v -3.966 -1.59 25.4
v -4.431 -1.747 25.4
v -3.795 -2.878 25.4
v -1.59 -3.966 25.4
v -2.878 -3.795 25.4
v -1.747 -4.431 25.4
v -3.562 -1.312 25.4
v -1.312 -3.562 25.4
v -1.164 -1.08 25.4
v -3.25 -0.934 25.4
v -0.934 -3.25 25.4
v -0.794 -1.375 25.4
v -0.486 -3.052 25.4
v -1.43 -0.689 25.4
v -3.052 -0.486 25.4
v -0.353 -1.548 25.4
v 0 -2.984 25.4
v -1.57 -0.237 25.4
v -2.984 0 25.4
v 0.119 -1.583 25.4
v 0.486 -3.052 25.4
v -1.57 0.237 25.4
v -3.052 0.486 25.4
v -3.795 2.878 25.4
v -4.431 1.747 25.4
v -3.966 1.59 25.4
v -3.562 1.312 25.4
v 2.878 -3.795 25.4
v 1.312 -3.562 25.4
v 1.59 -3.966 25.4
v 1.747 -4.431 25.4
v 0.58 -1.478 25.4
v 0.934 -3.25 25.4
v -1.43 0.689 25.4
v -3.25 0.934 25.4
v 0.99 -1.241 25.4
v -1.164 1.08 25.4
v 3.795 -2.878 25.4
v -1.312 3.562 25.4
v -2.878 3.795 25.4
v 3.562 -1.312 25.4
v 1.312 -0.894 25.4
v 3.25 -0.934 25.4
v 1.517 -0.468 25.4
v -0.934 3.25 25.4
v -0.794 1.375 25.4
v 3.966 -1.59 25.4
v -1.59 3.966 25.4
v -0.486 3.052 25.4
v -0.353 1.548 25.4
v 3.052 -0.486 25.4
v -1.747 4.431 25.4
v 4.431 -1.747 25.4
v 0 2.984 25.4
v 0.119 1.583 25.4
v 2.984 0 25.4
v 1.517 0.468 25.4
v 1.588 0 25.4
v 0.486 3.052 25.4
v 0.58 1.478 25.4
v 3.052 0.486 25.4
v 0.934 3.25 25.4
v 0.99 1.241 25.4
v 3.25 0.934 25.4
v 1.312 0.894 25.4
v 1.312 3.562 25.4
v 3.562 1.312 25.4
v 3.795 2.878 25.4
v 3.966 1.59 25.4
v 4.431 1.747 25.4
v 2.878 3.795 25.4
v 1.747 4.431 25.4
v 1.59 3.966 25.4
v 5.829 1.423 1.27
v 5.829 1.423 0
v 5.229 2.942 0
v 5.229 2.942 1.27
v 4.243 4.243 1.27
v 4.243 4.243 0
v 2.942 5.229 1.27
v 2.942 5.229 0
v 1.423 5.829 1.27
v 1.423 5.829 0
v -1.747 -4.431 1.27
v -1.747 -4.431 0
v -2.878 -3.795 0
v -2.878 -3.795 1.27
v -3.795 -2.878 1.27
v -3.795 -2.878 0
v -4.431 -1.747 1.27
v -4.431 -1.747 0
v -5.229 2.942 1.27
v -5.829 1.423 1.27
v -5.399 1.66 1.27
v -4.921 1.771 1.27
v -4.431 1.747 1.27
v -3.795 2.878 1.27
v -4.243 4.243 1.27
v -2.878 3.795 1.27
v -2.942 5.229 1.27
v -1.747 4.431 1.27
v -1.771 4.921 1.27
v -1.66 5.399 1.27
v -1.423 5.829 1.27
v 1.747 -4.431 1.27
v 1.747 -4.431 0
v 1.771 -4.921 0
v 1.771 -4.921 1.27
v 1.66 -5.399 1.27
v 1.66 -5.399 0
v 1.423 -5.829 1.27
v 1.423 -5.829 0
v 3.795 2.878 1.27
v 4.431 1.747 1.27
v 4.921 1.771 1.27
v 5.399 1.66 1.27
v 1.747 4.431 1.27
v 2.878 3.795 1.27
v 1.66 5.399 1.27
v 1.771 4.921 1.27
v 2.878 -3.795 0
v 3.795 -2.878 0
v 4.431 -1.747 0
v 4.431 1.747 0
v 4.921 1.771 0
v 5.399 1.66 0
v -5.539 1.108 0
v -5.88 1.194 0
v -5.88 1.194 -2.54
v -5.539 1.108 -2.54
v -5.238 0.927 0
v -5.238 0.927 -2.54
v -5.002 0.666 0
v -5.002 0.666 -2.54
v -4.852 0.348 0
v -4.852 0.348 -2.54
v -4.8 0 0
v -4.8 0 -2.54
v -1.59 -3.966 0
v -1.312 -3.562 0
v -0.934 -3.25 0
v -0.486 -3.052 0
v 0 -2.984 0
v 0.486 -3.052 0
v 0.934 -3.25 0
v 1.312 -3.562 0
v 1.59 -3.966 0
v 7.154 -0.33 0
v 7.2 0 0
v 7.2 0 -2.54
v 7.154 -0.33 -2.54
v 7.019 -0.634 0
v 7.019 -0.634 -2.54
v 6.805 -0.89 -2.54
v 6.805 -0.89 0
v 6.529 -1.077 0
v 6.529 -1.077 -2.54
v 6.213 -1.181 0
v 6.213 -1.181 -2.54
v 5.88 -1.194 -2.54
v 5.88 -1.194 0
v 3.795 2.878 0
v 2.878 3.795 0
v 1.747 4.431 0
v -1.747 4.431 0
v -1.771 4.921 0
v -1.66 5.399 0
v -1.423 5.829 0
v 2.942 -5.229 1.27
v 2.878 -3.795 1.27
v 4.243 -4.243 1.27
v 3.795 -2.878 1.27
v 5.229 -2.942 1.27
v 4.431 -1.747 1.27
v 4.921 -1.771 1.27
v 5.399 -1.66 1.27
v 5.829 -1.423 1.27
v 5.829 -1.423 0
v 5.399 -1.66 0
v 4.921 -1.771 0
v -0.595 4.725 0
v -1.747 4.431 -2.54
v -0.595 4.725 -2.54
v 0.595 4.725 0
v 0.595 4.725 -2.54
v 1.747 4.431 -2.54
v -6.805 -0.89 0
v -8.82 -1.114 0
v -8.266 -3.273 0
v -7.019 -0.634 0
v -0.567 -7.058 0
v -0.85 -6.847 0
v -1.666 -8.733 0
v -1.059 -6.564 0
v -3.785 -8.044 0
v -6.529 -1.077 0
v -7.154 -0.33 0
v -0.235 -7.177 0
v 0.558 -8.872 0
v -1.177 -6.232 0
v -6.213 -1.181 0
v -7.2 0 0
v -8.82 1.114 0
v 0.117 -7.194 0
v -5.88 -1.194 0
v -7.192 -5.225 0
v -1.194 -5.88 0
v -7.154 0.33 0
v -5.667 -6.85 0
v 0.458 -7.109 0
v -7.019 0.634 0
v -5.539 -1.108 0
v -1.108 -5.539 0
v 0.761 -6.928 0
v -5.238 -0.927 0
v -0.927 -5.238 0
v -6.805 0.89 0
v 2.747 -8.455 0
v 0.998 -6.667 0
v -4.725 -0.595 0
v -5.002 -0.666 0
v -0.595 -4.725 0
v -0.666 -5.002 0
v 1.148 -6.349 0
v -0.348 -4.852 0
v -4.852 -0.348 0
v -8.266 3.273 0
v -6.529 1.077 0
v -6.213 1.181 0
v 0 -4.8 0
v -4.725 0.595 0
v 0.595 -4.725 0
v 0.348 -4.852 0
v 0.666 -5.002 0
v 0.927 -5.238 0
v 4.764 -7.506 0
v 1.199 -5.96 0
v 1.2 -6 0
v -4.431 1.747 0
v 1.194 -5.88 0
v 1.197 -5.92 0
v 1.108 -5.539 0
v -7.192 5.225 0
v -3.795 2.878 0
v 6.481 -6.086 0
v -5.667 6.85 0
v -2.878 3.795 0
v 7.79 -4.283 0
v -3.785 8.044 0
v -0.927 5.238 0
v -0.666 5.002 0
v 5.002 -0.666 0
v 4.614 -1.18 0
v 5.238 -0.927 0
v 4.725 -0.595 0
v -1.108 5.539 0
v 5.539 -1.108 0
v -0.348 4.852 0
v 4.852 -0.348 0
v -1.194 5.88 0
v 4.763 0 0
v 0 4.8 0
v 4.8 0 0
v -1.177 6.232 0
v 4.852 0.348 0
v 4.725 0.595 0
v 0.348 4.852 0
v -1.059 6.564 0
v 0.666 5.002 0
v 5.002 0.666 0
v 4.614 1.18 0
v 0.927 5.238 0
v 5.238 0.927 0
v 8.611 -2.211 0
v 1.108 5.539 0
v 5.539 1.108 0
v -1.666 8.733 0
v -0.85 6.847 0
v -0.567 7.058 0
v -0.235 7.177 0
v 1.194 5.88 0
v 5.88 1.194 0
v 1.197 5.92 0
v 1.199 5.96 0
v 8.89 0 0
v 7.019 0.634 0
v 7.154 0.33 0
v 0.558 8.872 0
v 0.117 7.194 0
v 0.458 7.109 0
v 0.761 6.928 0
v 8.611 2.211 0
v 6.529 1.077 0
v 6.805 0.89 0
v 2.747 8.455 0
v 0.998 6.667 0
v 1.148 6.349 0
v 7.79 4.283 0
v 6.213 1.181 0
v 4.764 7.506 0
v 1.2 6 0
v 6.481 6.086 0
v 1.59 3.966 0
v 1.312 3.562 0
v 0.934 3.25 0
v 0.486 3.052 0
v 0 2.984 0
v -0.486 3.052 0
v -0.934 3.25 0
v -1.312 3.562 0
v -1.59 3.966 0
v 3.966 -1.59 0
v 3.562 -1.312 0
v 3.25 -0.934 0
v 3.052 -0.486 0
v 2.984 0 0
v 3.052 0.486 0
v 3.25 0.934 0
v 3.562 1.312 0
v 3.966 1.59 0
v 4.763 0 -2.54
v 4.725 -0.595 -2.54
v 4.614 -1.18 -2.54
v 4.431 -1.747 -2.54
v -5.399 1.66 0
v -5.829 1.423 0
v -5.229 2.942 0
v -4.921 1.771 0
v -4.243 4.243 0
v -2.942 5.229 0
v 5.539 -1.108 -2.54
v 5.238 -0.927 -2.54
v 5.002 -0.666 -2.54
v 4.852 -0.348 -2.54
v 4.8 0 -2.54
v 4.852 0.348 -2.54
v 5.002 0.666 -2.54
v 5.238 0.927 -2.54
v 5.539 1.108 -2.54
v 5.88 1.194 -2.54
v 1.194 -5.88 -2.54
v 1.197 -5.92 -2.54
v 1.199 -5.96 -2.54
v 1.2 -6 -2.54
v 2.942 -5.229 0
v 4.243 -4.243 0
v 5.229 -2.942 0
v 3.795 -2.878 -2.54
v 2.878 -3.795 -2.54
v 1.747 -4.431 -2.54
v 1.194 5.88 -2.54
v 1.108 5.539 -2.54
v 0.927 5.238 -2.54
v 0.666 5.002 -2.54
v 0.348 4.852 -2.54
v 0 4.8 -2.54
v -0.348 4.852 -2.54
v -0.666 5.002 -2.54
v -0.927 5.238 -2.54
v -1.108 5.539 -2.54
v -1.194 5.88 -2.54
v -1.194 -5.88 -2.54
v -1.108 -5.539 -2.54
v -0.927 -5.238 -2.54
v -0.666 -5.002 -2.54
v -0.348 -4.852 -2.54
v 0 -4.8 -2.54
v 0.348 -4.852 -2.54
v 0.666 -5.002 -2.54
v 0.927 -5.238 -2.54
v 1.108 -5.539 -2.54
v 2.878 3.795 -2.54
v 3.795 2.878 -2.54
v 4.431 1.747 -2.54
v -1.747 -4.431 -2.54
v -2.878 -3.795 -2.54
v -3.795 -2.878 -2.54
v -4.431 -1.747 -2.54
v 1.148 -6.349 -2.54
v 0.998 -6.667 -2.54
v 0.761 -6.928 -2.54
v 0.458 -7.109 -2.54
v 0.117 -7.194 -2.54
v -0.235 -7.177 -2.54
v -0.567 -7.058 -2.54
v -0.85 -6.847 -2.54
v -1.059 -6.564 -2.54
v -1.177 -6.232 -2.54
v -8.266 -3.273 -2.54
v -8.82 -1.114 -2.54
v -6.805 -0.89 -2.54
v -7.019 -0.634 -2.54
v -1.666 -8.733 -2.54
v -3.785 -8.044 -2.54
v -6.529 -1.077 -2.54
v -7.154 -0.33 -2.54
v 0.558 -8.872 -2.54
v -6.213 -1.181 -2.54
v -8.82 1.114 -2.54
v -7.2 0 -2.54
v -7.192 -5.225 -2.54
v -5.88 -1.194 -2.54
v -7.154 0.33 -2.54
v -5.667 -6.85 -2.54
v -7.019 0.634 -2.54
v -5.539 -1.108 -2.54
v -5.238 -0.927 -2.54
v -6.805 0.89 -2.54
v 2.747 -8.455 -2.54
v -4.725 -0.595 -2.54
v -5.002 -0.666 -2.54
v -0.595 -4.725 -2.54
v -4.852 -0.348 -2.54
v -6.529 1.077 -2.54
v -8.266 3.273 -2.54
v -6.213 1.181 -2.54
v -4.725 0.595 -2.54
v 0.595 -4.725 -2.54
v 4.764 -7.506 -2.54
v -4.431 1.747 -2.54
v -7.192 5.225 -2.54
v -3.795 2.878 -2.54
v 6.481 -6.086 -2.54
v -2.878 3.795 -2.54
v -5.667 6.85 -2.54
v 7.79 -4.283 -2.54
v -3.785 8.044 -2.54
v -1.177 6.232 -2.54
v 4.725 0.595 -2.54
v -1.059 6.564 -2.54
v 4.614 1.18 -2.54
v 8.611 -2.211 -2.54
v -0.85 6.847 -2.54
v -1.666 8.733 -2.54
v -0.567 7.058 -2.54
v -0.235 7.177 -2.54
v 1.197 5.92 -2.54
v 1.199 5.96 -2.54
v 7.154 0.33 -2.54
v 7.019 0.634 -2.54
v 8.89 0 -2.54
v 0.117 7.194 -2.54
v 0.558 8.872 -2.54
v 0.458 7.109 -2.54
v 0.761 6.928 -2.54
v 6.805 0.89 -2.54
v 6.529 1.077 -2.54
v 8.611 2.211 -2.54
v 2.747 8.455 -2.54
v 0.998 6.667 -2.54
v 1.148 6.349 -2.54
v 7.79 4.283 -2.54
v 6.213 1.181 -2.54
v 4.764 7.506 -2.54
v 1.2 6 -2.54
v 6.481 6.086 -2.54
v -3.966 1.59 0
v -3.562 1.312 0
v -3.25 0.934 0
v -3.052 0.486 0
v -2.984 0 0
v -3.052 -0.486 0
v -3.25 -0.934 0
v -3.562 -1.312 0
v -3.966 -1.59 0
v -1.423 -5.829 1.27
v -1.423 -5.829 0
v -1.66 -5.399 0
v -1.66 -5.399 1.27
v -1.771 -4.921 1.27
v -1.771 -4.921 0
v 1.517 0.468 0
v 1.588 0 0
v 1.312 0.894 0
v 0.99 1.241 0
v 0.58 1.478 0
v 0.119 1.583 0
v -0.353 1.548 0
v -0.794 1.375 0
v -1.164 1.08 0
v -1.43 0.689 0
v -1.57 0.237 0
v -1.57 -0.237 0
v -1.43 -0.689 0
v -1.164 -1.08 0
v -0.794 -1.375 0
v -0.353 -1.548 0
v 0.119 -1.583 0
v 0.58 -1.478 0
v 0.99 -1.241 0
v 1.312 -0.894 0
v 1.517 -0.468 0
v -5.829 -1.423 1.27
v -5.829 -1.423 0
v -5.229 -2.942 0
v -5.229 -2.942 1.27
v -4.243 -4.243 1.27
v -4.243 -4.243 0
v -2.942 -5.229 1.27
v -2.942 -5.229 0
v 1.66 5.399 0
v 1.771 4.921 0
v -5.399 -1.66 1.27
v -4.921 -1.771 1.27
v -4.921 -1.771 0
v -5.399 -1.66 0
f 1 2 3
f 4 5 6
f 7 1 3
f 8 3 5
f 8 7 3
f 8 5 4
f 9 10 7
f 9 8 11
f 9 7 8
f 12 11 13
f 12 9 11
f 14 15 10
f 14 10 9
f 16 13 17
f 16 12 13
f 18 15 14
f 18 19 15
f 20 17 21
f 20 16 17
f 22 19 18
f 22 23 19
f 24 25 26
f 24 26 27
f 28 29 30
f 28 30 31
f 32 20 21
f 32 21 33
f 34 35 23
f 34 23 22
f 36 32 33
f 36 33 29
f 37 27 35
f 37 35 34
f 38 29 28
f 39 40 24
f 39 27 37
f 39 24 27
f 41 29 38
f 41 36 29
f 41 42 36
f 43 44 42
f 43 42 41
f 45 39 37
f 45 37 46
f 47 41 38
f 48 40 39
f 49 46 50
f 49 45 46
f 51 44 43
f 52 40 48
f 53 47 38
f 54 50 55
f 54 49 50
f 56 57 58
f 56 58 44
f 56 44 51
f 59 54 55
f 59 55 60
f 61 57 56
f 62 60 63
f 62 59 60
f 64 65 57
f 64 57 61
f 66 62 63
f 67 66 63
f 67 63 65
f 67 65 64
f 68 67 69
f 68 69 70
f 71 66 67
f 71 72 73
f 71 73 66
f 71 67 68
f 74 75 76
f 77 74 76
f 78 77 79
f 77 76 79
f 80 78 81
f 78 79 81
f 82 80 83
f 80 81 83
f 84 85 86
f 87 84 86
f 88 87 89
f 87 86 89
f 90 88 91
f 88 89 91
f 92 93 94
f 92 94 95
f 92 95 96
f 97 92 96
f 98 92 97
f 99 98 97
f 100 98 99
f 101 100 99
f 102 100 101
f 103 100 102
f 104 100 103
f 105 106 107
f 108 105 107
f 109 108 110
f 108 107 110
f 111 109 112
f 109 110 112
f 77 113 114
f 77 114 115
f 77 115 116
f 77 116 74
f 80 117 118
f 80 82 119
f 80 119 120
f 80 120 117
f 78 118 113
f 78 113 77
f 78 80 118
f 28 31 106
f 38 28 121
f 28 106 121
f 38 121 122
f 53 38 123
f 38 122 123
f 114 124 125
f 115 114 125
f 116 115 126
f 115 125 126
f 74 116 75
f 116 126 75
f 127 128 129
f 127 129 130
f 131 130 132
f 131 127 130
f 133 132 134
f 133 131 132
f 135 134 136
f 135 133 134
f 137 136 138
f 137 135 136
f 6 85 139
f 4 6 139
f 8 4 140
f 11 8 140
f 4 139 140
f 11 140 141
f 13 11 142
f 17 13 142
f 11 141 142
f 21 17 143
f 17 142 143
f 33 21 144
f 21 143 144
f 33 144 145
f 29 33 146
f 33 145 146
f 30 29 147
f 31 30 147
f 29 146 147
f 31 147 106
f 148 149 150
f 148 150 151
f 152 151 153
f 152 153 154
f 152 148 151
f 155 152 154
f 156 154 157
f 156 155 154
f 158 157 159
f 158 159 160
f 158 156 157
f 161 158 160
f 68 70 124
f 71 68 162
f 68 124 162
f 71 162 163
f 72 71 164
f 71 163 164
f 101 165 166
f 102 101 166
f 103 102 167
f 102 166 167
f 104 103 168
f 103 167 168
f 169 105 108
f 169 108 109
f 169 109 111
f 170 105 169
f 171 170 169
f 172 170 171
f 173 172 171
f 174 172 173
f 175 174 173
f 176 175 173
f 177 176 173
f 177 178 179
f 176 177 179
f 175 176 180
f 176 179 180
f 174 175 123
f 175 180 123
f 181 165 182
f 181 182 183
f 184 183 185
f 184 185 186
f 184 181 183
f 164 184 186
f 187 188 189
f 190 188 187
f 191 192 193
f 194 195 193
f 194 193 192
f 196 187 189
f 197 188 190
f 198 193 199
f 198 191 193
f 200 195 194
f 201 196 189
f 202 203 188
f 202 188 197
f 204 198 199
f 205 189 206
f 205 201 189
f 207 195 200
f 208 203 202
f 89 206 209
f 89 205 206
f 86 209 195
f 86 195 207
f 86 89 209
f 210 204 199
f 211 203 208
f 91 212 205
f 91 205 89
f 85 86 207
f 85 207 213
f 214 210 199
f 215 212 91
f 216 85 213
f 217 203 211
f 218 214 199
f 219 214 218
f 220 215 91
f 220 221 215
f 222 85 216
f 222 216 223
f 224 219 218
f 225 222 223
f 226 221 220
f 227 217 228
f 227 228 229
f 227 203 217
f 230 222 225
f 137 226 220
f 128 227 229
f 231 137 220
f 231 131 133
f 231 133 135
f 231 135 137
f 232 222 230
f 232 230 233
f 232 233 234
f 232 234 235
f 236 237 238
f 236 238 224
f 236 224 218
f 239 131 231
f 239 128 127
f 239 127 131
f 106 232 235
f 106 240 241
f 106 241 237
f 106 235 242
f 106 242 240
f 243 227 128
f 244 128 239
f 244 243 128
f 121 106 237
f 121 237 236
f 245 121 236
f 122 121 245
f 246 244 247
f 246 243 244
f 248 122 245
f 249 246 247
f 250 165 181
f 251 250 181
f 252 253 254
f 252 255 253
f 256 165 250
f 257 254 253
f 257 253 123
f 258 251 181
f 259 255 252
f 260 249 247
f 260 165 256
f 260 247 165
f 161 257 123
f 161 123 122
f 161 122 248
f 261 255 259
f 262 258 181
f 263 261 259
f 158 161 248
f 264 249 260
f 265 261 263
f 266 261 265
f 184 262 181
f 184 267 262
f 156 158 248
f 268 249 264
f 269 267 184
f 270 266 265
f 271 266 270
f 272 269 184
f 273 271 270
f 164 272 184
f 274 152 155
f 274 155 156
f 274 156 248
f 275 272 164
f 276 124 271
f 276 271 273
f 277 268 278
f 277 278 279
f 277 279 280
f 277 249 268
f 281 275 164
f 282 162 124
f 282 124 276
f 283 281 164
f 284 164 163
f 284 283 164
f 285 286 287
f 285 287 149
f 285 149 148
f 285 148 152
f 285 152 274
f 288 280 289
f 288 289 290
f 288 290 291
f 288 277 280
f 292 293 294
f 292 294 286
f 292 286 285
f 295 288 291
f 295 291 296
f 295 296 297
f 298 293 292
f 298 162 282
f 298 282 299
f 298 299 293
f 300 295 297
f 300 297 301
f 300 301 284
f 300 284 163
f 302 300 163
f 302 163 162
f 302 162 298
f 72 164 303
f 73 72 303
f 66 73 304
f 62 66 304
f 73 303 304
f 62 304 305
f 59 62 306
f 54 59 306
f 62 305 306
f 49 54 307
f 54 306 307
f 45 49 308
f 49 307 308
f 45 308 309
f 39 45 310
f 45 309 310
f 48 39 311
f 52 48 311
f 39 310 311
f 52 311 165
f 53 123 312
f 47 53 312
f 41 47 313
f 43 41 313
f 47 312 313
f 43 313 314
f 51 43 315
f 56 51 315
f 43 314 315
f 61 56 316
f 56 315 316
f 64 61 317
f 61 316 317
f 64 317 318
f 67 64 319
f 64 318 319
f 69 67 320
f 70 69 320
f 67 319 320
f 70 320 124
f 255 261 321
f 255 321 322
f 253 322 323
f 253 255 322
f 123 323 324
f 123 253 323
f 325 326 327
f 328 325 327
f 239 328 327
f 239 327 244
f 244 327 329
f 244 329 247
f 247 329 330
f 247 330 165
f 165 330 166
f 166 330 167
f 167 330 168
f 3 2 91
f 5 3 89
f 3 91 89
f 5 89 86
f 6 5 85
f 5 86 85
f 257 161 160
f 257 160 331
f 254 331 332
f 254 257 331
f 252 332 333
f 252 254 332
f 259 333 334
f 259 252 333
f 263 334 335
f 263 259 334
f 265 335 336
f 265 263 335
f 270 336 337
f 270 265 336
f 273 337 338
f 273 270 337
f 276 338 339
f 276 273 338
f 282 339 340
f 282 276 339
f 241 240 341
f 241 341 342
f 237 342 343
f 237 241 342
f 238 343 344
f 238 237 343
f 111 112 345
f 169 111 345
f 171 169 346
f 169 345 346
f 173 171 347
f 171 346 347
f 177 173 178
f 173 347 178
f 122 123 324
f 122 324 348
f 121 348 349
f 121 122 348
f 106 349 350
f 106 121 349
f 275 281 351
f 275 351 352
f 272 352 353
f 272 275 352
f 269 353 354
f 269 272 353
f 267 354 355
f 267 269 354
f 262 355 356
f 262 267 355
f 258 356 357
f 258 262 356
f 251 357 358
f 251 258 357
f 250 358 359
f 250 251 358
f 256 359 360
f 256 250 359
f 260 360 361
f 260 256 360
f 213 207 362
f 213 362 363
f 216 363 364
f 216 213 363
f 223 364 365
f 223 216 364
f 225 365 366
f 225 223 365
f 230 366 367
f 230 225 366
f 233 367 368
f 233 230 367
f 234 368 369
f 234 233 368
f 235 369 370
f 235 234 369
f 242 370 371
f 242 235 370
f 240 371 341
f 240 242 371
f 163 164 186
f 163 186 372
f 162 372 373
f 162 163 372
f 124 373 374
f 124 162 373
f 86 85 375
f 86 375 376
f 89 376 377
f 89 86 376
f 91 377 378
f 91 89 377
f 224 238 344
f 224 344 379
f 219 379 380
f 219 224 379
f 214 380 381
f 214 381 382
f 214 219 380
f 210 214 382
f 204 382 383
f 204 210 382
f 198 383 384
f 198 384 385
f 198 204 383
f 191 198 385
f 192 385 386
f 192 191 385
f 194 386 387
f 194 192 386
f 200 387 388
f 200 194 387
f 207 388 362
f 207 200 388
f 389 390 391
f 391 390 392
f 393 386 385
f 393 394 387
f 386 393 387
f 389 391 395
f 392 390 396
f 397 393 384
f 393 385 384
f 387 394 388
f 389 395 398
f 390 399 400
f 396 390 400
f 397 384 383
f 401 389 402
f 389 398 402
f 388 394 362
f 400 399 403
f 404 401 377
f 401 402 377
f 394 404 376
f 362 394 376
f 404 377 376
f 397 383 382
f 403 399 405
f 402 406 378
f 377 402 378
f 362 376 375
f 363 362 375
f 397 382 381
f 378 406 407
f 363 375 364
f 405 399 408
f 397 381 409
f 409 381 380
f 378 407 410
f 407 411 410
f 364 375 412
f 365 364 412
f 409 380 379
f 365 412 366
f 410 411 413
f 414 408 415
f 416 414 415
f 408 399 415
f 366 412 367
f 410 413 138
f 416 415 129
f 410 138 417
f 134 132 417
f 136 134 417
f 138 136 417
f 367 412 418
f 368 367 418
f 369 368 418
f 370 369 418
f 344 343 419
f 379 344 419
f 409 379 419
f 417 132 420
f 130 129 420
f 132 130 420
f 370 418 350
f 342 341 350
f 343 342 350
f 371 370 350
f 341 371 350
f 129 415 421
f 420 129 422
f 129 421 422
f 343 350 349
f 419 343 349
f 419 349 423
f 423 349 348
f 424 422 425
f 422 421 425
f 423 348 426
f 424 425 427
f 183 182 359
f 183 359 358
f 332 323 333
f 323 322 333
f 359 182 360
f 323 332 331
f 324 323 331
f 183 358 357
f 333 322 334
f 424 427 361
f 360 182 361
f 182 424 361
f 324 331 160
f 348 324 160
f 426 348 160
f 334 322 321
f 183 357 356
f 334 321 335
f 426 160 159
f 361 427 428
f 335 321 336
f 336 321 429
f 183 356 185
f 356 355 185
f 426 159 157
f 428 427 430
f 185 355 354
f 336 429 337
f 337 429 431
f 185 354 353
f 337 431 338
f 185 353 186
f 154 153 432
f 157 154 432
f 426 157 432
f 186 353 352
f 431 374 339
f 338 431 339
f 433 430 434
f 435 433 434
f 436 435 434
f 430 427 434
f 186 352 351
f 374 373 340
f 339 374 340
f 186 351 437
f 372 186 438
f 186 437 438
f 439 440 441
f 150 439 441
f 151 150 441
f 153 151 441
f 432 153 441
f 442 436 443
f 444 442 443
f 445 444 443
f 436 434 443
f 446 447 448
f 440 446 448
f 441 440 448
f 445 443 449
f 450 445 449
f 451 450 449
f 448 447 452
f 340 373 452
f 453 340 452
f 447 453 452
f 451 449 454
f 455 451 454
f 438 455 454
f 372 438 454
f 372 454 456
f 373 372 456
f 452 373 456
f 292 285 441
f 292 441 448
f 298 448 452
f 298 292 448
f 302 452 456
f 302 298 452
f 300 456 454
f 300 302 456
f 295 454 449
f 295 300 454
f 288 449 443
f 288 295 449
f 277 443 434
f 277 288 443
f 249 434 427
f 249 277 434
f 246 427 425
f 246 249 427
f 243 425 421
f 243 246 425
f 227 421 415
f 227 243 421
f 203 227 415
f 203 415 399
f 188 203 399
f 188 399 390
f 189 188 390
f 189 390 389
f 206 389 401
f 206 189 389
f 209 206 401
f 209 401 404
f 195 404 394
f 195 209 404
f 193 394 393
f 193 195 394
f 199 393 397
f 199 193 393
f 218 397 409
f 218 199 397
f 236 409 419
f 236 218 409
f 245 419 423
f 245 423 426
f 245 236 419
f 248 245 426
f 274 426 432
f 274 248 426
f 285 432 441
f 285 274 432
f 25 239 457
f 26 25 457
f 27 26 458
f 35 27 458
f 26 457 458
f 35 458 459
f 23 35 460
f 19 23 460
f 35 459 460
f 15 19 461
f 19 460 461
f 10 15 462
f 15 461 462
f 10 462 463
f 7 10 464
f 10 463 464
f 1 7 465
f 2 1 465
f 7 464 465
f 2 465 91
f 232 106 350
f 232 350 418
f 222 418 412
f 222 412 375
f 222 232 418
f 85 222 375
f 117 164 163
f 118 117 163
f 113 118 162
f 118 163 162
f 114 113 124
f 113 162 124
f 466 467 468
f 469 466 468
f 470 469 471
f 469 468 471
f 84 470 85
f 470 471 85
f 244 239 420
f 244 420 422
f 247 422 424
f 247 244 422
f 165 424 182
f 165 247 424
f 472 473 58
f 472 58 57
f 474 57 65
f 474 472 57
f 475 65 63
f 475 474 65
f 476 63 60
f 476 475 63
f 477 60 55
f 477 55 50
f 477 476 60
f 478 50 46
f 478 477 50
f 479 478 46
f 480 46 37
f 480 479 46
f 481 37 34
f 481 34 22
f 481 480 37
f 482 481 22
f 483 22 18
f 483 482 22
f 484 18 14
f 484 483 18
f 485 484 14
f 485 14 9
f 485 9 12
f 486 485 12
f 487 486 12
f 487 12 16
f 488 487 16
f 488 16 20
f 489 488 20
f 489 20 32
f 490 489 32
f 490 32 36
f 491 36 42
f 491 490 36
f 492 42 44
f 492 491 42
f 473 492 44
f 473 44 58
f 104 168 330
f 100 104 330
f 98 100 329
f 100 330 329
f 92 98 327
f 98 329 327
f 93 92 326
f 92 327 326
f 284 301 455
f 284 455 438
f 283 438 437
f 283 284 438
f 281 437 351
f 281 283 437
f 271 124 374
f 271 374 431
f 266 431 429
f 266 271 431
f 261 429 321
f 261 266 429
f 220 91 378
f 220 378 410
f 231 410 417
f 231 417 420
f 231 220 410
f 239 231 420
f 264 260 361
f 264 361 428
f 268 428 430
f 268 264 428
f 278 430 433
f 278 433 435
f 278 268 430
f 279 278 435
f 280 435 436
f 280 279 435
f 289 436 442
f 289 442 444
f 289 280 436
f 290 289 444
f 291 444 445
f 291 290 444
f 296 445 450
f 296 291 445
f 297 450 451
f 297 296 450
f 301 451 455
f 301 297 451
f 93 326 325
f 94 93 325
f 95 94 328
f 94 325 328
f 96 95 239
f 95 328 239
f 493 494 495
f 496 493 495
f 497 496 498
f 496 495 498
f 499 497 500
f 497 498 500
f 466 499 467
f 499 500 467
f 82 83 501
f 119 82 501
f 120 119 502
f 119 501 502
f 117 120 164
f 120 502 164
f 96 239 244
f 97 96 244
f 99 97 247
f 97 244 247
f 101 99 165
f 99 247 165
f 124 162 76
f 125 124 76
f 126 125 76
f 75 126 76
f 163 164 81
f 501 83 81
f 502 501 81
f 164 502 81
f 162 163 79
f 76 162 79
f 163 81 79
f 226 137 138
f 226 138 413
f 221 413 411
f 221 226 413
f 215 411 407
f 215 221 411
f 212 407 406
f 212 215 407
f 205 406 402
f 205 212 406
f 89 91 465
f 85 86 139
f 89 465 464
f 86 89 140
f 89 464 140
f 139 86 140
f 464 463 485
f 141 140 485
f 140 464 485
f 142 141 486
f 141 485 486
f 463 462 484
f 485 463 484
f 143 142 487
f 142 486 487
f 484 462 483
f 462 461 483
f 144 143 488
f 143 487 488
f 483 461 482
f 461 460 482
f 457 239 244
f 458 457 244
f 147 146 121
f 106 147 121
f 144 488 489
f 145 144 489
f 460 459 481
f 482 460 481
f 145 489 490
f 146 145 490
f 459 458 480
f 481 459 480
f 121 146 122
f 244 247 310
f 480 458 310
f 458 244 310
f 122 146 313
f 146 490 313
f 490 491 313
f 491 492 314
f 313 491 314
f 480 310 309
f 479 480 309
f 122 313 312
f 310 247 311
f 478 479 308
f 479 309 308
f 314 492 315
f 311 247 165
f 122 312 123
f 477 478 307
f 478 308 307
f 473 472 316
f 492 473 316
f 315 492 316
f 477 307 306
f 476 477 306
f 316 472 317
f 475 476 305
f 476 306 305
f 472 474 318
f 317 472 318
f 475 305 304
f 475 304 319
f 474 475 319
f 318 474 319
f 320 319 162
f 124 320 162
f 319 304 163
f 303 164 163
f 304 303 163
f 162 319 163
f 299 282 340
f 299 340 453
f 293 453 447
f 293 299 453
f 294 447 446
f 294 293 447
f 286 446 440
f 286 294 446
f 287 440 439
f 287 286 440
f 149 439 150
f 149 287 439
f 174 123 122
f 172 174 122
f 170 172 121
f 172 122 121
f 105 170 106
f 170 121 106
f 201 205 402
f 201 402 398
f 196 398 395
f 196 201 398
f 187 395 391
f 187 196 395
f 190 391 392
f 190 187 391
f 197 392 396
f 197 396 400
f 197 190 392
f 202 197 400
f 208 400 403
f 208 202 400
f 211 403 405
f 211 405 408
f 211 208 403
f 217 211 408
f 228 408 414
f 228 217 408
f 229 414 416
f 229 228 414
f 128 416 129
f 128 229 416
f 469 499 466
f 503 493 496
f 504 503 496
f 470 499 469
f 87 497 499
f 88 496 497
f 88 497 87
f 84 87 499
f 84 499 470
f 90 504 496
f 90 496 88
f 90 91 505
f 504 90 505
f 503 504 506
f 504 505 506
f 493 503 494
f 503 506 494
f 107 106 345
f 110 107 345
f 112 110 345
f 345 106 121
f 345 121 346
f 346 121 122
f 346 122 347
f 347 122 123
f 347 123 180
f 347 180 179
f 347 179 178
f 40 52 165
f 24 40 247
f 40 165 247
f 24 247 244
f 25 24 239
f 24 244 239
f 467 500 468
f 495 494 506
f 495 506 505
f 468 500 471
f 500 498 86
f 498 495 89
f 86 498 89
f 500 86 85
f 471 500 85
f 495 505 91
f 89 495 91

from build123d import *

# Parameters (mm, degrees)
F0_R     = 8.89
F1_DEPTH = 2.54
F0_R_2   = 1.5875
F2_DEPTH = 25.4
F3_DEPTH = 1.27


# Not quite as in the source:
# - a feature names something its author has since deleted; it is built from what else it names


with BuildPart() as f1:
    # F0 (on Top) → F1 (new body)
    with BuildSketch(Plane.XY):
        Circle(F0_R)
        with BuildLine():
            ThreePointArc((1.4227110748, 5.8288851076), (4.2426411821, 4.2426411821), (5.8288851076, 1.4227110748))
            ThreePointArc((5.8288851076, 1.4227110748), (5.8555597964, 1.3085976735), (5.880000686, 1.1939850638))
            ThreePointArc((5.880000686, 1.1939850638), (6.8049852658, 0.8899439223), (7.20000084, 0))
            ThreePointArc((7.20000084, 0), (6.8049852658, -0.8899439223), (5.880000686, -1.1939850638))
            ThreePointArc((5.880000686, -1.1939850638), (5.8555597964, -1.3085976735), (5.8288851076, -1.4227110748))
            ThreePointArc((5.8288851076, -1.4227110748), (4.2426411821, -4.2426411821), (1.4227110748, -5.8288851076))
            ThreePointArc((1.4227110748, -5.8288851076), (1.3085976735, -5.8555597964), (1.1939850638, -5.880000686))
            ThreePointArc((1.1939850638, -5.880000686), (1.1984954276, -5.9399253629), (1.20000014, -6.0000007))
            ThreePointArc((1.20000014, -6.0000007), (-0.0600753371, -7.1984961276), (-1.1939850638, -5.880000686))
            ThreePointArc((-1.1939850638, -5.880000686), (-1.3085976735, -5.8555597964), (-1.4227110748, -5.8288851076))
            ThreePointArc((-1.4227110748, -5.8288851076), (-4.2426411821, -4.2426411821), (-5.8288851076, -1.4227110748))
            ThreePointArc((-5.8288851076, -1.4227110748), (-5.8555597964, -1.3085976735), (-5.880000686, -1.1939850638))
            ThreePointArc((-5.880000686, -1.1939850638), (-7.20000084, 0), (-5.880000686, 1.1939850638))
            ThreePointArc((-5.880000686, 1.1939850638), (-5.8555597964, 1.3085976735), (-5.8288851076, 1.4227110748))
            ThreePointArc((-5.8288851076, 1.4227110748), (-4.2426411821, 4.2426411821), (-1.4227110748, 5.8288851076))
            ThreePointArc((-1.4227110748, 5.8288851076), (-1.3085976735, 5.8555597964), (-1.1939850638, 5.880000686))
            ThreePointArc((-1.1939850638, 5.880000686), (-0.0600753371, 7.1984961276), (1.20000014, 6.0000007))
            ThreePointArc((1.20000014, 6.0000007), (1.1984954276, 5.9399253629), (1.1939850638, 5.880000686))
            ThreePointArc((1.1939850638, 5.880000686), (1.3085976735, 5.8555597964), (1.4227110748, 5.8288851076))
        make_face(mode=Mode.SUBTRACT)
        with BuildLine():
            ThreePointArc((-4.4306066667, 1.7467486411), (-3.3675960454, 3.3675960454), (-1.7467486411, 4.4306066667))
            ThreePointArc((-1.7467486411, 4.4306066667), (-1.7320982571, 5.1638970948), (-1.4227110748, 5.8288851076))
            ThreePointArc((-1.4227110748, 5.8288851076), (-4.2426411821, 4.2426411821), (-5.8288851076, 1.4227110748))
            ThreePointArc((-5.8288851076, 1.4227110748), (-5.1638970948, 1.7320982571), (-4.4306066667, 1.7467486411))
        make_face()
        with BuildLine():
            ThreePointArc((1.7467486411, 4.4306066667), (3.3675960454, 3.3675960454), (4.4306066667, 1.7467486411))
            ThreePointArc((4.4306066667, 1.7467486411), (5.1638970948, 1.7320982571), (5.8288851076, 1.4227110748))
            ThreePointArc((5.8288851076, 1.4227110748), (4.2426411821, 4.2426411821), (1.4227110748, 5.8288851076))
            ThreePointArc((1.4227110748, 5.8288851076), (1.7320982571, 5.1638970948), (1.7467486411, 4.4306066667))
        make_face()
        with BuildLine():
            ThreePointArc((5.8288851076, -1.4227110748), (5.1638970948, -1.7320982571), (4.4306066667, -1.7467486411))
            ThreePointArc((4.4306066667, -1.7467486411), (3.3675960454, -3.3675960454), (1.7467486411, -4.4306066667))
            ThreePointArc((1.7467486411, -4.4306066667), (1.7320982571, -5.1638970948), (1.4227110748, -5.8288851076))
            ThreePointArc((1.4227110748, -5.8288851076), (4.2426411821, -4.2426411821), (5.8288851076, -1.4227110748))
        make_face()
        with BuildLine():
            ThreePointArc((-1.4227110748, -5.8288851076), (-1.7320982571, -5.1638970948), (-1.7467486411, -4.4306066667))
            ThreePointArc((-1.7467486411, -4.4306066667), (-3.3675960454, -3.3675960454), (-4.4306066667, -1.7467486411))
            ThreePointArc((-4.4306066667, -1.7467486411), (-5.1638970948, -1.7320982571), (-5.8288851076, -1.4227110748))
            ThreePointArc((-5.8288851076, -1.4227110748), (-4.2426411821, -4.2426411821), (-1.4227110748, -5.8288851076))
        make_face()
        with BuildLine():
            ThreePointArc((-1.7467486411, 4.4306066667), (0, 4.7625), (1.7467486411, 4.4306066667))
            ThreePointArc((1.7467486411, 4.4306066667), (1.7320982571, 5.1638970948), (1.4227110748, 5.8288851076))
            ThreePointArc((1.4227110748, 5.8288851076), (1.3085976735, 5.8555597964), (1.1939850638, 5.880000686))
            ThreePointArc((1.1939850638, 5.880000686), (0, 4.80000056), (-1.1939850638, 5.880000686))
            ThreePointArc((-1.1939850638, 5.880000686), (-1.3085976735, 5.8555597964), (-1.4227110748, 5.8288851076))
            ThreePointArc((-1.4227110748, 5.8288851076), (-1.7320982571, 5.1638970948), (-1.7467486411, 4.4306066667))
        make_face()
        with BuildLine():
            ThreePointArc((4.4306066667, 1.7467486411), (4.678791003, 0.889), (4.7625, 0))
            ThreePointArc((4.7625, 0), (4.678791003, -0.889), (4.4306066667, -1.7467486411))
            ThreePointArc((4.4306066667, -1.7467486411), (5.1638970948, -1.7320982571), (5.8288851076, -1.4227110748))
            ThreePointArc((5.8288851076, -1.4227110748), (5.8555597964, -1.3085976735), (5.880000686, -1.1939850638))
            ThreePointArc((5.880000686, -1.1939850638), (4.80000056, 0), (5.880000686, 1.1939850638))
            ThreePointArc((5.880000686, 1.1939850638), (5.8555597964, 1.3085976735), (5.8288851076, 1.4227110748))
            ThreePointArc((5.8288851076, 1.4227110748), (5.1638970948, 1.7320982571), (4.4306066667, 1.7467486411))
        make_face()
        with BuildLine():
            ThreePointArc((1.4227110748, -5.8288851076), (1.7320982571, -5.1638970948), (1.7467486411, -4.4306066667))
            ThreePointArc((1.7467486411, -4.4306066667), (0, -4.7625), (-1.7467486411, -4.4306066667))
            ThreePointArc((-1.7467486411, -4.4306066667), (-1.7320982571, -5.1638970948), (-1.4227110748, -5.8288851076))
            ThreePointArc((-1.4227110748, -5.8288851076), (-1.3085976735, -5.8555597964), (-1.1939850638, -5.880000686))
            ThreePointArc((-1.1939850638, -5.880000686), (0, -4.80000056), (1.1939850638, -5.880000686))
            ThreePointArc((1.1939850638, -5.880000686), (1.3085976735, -5.8555597964), (1.4227110748, -5.8288851076))
        make_face()
        with BuildLine():
            ThreePointArc((-4.4306066667, -1.7467486411), (-4.7625, 0), (-4.4306066667, 1.7467486411))
            ThreePointArc((-4.4306066667, 1.7467486411), (-5.1638970948, 1.7320982571), (-5.8288851076, 1.4227110748))
            ThreePointArc((-5.8288851076, 1.4227110748), (-5.8555597964, 1.3085976735), (-5.880000686, 1.1939850638))
            ThreePointArc((-5.880000686, 1.1939850638), (-5.1100567777, 0.8049845658), (-4.80000056, 0))
            ThreePointArc((-4.80000056, 0), (-5.1100567777, -0.8049845658), (-5.880000686, -1.1939850638))
            ThreePointArc((-5.880000686, -1.1939850638), (-5.8555597964, -1.3085976735), (-5.8288851076, -1.4227110748))
            ThreePointArc((-5.8288851076, -1.4227110748), (-5.1638970948, -1.7320982571), (-4.4306066667, -1.7467486411))
        make_face()
    extrude(amount=-F1_DEPTH)


with BuildPart() as f2:
    # F0 (on Top) → F2 (new body)
    with BuildSketch(Plane.XY):
        with BuildLine():
            ThreePointArc((4.4306066667, -1.7467486411), (2.9845, 0), (4.4306066667, 1.7467486411))
            ThreePointArc((4.4306066667, 1.7467486411), (3.3675960454, 3.3675960454), (1.7467486411, 4.4306066667))
            ThreePointArc((1.7467486411, 4.4306066667), (0, 2.9845), (-1.7467486411, 4.4306066667))
            ThreePointArc((-1.7467486411, 4.4306066667), (-3.3675960454, 3.3675960454), (-4.4306066667, 1.7467486411))
            ThreePointArc((-4.4306066667, 1.7467486411), (-2.9845, 0), (-4.4306066667, -1.7467486411))
            ThreePointArc((-4.4306066667, -1.7467486411), (-3.3675960454, -3.3675960454), (-1.7467486411, -4.4306066667))
            ThreePointArc((-1.7467486411, -4.4306066667), (0, -2.9845), (1.7467486411, -4.4306066667))
            ThreePointArc((1.7467486411, -4.4306066667), (3.3675960454, -3.3675960454), (4.4306066667, -1.7467486411))
        make_face()
        Circle(F0_R_2, mode=Mode.SUBTRACT)
    extrude(amount=F2_DEPTH)


with BuildPart() as f3:
    # F0 (on Top) → F3 (new body)
    with BuildSketch(Plane.XY):
        with BuildLine():
            ThreePointArc((-1.4227110748, -5.8288851076), (-1.7320982571, -5.1638970948), (-1.7467486411, -4.4306066667))
            ThreePointArc((-1.7467486411, -4.4306066667), (-3.3675960454, -3.3675960454), (-4.4306066667, -1.7467486411))
            ThreePointArc((-4.4306066667, -1.7467486411), (-5.1638970948, -1.7320982571), (-5.8288851076, -1.4227110748))
            ThreePointArc((-5.8288851076, -1.4227110748), (-4.2426411821, -4.2426411821), (-1.4227110748, -5.8288851076))
        make_face()
    extrude(amount=F3_DEPTH)


with BuildPart() as f3b:
    # F0 (on Top) → F3, piece 2 (new body)
    with BuildSketch(Plane.XY):
        with BuildLine():
            ThreePointArc((5.8288851076, -1.4227110748), (5.1638970948, -1.7320982571), (4.4306066667, -1.7467486411))
            ThreePointArc((4.4306066667, -1.7467486411), (3.3675960454, -3.3675960454), (1.7467486411, -4.4306066667))
            ThreePointArc((1.7467486411, -4.4306066667), (1.7320982571, -5.1638970948), (1.4227110748, -5.8288851076))
            ThreePointArc((1.4227110748, -5.8288851076), (4.2426411821, -4.2426411821), (5.8288851076, -1.4227110748))
        make_face()
    extrude(amount=F3_DEPTH)


with BuildPart() as f3c:
    # F0 (on Top) → F3, piece 3 (new body)
    with BuildSketch(Plane.XY):
        with BuildLine():
            ThreePointArc((1.7467486411, 4.4306066667), (3.3675960454, 3.3675960454), (4.4306066667, 1.7467486411))
            ThreePointArc((4.4306066667, 1.7467486411), (5.1638970948, 1.7320982571), (5.8288851076, 1.4227110748))
            ThreePointArc((5.8288851076, 1.4227110748), (4.2426411821, 4.2426411821), (1.4227110748, 5.8288851076))
            ThreePointArc((1.4227110748, 5.8288851076), (1.7320982571, 5.1638970948), (1.7467486411, 4.4306066667))
        make_face()
    extrude(amount=F3_DEPTH)


with BuildPart() as f3d:
    # F0 (on Top) → F3, piece 4 (new body)
    with BuildSketch(Plane.XY):
        with BuildLine():
            ThreePointArc((-4.4306066667, 1.7467486411), (-3.3675960454, 3.3675960454), (-1.7467486411, 4.4306066667))
            ThreePointArc((-1.7467486411, 4.4306066667), (-1.7320982571, 5.1638970948), (-1.4227110748, 5.8288851076))
            ThreePointArc((-1.4227110748, 5.8288851076), (-4.2426411821, 4.2426411821), (-5.8288851076, 1.4227110748))
            ThreePointArc((-5.8288851076, 1.4227110748), (-5.1638970948, 1.7320982571), (-4.4306066667, 1.7467486411))
        make_face()
    extrude(amount=F3_DEPTH)


solid = Compound([f1.part, f2.part, f3.part, f3b.part, f3c.part, f3d.part])
